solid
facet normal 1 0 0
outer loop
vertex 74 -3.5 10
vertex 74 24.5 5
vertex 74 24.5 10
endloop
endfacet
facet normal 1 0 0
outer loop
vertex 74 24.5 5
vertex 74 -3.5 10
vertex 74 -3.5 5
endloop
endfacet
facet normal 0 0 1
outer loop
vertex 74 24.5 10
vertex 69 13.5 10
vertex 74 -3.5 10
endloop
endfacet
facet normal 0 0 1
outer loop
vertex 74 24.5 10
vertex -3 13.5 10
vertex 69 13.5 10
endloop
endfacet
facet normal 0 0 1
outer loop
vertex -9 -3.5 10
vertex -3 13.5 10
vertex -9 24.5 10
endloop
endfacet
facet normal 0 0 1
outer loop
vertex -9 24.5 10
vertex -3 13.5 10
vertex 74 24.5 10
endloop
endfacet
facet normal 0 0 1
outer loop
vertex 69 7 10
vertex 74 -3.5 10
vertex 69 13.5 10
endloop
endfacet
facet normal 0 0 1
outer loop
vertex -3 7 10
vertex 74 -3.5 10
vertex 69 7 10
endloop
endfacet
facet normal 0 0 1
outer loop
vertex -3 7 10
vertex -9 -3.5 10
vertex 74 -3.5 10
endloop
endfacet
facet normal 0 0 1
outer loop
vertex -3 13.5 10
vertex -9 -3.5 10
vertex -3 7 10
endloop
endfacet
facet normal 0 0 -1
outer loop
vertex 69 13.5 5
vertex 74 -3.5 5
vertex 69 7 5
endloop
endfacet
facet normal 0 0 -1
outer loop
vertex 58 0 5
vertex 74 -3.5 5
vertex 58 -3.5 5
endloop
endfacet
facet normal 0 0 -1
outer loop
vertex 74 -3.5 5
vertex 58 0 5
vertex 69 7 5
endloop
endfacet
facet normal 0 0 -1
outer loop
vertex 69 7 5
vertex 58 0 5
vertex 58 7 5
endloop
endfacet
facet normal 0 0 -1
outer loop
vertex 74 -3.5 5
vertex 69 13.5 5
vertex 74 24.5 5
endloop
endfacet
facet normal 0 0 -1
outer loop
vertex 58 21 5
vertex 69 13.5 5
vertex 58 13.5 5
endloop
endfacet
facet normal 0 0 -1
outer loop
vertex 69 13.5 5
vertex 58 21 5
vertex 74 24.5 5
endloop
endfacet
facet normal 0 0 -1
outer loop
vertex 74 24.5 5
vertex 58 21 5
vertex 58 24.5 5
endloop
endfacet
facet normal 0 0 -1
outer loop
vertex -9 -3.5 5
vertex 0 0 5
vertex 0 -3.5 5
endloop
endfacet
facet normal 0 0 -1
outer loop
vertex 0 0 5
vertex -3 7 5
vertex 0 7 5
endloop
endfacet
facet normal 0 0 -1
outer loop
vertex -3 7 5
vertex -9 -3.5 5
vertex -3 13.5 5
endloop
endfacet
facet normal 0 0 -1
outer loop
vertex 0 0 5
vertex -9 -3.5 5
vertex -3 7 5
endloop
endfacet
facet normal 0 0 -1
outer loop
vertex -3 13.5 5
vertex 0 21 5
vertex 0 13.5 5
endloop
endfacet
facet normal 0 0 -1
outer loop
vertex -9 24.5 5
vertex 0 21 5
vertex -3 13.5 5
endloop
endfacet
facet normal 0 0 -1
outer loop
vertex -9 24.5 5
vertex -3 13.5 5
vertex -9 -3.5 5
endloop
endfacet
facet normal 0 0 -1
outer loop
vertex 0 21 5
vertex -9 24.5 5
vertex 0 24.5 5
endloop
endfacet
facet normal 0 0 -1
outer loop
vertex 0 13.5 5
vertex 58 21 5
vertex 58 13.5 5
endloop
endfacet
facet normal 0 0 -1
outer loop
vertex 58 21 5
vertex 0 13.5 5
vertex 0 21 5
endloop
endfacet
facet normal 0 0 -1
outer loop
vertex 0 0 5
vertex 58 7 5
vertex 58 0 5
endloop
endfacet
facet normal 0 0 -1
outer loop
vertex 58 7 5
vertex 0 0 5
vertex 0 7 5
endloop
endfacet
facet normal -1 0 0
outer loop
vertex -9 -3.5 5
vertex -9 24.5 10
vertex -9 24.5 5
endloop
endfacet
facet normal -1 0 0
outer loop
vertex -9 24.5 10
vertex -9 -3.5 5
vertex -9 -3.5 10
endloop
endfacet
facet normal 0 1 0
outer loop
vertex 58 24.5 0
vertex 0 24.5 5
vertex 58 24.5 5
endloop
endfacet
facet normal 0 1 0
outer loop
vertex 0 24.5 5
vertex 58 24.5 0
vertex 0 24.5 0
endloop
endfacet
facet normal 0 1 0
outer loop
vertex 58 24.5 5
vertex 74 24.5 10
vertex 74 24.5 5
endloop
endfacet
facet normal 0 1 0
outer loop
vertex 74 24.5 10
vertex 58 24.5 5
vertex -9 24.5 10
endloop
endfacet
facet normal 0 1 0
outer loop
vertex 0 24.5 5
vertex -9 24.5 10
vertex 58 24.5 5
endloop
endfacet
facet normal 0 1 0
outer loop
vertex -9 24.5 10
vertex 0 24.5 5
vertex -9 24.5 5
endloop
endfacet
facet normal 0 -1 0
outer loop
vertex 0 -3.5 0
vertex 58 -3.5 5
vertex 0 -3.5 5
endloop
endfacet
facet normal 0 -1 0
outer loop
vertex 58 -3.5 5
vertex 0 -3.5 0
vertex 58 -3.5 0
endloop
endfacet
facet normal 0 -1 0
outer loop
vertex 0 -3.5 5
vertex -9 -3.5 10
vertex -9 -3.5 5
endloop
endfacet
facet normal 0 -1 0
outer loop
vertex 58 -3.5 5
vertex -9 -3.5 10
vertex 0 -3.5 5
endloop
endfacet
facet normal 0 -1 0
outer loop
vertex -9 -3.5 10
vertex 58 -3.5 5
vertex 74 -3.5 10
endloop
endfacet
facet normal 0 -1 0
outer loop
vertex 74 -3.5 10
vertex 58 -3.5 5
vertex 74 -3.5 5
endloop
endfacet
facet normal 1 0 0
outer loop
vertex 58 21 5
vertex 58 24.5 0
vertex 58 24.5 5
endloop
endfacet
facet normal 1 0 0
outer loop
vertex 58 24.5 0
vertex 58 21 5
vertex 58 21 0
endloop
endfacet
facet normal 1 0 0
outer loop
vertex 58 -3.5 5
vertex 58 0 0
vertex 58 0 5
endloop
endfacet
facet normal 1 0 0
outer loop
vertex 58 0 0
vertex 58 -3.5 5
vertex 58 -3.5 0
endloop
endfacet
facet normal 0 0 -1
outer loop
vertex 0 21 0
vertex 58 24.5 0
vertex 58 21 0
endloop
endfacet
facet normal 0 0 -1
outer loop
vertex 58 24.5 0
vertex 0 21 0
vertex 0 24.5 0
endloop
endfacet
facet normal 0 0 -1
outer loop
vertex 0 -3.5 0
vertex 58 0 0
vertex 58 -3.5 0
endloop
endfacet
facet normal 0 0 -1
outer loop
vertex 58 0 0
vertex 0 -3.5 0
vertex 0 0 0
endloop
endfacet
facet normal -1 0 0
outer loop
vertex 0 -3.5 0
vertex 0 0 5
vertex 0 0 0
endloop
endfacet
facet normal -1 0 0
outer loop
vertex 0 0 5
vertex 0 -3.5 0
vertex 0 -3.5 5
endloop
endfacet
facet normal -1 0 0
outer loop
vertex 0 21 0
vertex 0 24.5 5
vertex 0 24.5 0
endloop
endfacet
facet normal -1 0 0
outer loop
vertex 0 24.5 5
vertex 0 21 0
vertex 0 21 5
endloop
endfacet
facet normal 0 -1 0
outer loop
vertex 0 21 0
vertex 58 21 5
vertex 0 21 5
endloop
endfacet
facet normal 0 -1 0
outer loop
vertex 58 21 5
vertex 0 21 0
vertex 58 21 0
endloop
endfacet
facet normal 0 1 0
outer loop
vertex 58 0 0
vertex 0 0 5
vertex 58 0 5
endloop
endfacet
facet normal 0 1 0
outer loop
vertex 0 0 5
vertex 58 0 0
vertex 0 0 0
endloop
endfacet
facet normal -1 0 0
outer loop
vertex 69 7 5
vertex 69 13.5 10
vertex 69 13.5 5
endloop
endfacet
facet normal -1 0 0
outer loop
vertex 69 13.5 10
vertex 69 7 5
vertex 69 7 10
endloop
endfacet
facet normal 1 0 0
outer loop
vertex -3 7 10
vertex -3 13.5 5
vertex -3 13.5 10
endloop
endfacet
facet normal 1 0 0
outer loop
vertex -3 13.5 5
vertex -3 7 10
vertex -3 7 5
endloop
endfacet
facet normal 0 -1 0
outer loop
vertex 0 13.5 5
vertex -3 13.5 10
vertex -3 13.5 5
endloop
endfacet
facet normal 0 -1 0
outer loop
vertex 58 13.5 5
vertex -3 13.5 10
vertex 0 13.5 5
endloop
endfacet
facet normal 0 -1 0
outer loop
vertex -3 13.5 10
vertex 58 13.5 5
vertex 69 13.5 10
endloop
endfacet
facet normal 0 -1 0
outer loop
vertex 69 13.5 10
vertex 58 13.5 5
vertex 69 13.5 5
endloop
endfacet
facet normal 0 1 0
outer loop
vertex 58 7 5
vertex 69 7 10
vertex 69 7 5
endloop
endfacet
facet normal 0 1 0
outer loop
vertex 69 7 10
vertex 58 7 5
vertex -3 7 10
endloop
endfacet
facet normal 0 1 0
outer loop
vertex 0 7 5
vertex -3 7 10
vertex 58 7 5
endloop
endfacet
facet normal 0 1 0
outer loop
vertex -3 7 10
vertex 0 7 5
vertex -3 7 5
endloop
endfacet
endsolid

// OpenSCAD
difference(){
    
    
    union() {translate([-9,-3.5, 5]) cube([83, 28, 5]);
    translate([0 , -3.5, 0]) cube([58, 28, 10]); }
    
    
    cube([58, 21, 5]); 
    
    translate([-3,7, 5]) cube([82 -10, 6.5, 5]); 
    }
    
